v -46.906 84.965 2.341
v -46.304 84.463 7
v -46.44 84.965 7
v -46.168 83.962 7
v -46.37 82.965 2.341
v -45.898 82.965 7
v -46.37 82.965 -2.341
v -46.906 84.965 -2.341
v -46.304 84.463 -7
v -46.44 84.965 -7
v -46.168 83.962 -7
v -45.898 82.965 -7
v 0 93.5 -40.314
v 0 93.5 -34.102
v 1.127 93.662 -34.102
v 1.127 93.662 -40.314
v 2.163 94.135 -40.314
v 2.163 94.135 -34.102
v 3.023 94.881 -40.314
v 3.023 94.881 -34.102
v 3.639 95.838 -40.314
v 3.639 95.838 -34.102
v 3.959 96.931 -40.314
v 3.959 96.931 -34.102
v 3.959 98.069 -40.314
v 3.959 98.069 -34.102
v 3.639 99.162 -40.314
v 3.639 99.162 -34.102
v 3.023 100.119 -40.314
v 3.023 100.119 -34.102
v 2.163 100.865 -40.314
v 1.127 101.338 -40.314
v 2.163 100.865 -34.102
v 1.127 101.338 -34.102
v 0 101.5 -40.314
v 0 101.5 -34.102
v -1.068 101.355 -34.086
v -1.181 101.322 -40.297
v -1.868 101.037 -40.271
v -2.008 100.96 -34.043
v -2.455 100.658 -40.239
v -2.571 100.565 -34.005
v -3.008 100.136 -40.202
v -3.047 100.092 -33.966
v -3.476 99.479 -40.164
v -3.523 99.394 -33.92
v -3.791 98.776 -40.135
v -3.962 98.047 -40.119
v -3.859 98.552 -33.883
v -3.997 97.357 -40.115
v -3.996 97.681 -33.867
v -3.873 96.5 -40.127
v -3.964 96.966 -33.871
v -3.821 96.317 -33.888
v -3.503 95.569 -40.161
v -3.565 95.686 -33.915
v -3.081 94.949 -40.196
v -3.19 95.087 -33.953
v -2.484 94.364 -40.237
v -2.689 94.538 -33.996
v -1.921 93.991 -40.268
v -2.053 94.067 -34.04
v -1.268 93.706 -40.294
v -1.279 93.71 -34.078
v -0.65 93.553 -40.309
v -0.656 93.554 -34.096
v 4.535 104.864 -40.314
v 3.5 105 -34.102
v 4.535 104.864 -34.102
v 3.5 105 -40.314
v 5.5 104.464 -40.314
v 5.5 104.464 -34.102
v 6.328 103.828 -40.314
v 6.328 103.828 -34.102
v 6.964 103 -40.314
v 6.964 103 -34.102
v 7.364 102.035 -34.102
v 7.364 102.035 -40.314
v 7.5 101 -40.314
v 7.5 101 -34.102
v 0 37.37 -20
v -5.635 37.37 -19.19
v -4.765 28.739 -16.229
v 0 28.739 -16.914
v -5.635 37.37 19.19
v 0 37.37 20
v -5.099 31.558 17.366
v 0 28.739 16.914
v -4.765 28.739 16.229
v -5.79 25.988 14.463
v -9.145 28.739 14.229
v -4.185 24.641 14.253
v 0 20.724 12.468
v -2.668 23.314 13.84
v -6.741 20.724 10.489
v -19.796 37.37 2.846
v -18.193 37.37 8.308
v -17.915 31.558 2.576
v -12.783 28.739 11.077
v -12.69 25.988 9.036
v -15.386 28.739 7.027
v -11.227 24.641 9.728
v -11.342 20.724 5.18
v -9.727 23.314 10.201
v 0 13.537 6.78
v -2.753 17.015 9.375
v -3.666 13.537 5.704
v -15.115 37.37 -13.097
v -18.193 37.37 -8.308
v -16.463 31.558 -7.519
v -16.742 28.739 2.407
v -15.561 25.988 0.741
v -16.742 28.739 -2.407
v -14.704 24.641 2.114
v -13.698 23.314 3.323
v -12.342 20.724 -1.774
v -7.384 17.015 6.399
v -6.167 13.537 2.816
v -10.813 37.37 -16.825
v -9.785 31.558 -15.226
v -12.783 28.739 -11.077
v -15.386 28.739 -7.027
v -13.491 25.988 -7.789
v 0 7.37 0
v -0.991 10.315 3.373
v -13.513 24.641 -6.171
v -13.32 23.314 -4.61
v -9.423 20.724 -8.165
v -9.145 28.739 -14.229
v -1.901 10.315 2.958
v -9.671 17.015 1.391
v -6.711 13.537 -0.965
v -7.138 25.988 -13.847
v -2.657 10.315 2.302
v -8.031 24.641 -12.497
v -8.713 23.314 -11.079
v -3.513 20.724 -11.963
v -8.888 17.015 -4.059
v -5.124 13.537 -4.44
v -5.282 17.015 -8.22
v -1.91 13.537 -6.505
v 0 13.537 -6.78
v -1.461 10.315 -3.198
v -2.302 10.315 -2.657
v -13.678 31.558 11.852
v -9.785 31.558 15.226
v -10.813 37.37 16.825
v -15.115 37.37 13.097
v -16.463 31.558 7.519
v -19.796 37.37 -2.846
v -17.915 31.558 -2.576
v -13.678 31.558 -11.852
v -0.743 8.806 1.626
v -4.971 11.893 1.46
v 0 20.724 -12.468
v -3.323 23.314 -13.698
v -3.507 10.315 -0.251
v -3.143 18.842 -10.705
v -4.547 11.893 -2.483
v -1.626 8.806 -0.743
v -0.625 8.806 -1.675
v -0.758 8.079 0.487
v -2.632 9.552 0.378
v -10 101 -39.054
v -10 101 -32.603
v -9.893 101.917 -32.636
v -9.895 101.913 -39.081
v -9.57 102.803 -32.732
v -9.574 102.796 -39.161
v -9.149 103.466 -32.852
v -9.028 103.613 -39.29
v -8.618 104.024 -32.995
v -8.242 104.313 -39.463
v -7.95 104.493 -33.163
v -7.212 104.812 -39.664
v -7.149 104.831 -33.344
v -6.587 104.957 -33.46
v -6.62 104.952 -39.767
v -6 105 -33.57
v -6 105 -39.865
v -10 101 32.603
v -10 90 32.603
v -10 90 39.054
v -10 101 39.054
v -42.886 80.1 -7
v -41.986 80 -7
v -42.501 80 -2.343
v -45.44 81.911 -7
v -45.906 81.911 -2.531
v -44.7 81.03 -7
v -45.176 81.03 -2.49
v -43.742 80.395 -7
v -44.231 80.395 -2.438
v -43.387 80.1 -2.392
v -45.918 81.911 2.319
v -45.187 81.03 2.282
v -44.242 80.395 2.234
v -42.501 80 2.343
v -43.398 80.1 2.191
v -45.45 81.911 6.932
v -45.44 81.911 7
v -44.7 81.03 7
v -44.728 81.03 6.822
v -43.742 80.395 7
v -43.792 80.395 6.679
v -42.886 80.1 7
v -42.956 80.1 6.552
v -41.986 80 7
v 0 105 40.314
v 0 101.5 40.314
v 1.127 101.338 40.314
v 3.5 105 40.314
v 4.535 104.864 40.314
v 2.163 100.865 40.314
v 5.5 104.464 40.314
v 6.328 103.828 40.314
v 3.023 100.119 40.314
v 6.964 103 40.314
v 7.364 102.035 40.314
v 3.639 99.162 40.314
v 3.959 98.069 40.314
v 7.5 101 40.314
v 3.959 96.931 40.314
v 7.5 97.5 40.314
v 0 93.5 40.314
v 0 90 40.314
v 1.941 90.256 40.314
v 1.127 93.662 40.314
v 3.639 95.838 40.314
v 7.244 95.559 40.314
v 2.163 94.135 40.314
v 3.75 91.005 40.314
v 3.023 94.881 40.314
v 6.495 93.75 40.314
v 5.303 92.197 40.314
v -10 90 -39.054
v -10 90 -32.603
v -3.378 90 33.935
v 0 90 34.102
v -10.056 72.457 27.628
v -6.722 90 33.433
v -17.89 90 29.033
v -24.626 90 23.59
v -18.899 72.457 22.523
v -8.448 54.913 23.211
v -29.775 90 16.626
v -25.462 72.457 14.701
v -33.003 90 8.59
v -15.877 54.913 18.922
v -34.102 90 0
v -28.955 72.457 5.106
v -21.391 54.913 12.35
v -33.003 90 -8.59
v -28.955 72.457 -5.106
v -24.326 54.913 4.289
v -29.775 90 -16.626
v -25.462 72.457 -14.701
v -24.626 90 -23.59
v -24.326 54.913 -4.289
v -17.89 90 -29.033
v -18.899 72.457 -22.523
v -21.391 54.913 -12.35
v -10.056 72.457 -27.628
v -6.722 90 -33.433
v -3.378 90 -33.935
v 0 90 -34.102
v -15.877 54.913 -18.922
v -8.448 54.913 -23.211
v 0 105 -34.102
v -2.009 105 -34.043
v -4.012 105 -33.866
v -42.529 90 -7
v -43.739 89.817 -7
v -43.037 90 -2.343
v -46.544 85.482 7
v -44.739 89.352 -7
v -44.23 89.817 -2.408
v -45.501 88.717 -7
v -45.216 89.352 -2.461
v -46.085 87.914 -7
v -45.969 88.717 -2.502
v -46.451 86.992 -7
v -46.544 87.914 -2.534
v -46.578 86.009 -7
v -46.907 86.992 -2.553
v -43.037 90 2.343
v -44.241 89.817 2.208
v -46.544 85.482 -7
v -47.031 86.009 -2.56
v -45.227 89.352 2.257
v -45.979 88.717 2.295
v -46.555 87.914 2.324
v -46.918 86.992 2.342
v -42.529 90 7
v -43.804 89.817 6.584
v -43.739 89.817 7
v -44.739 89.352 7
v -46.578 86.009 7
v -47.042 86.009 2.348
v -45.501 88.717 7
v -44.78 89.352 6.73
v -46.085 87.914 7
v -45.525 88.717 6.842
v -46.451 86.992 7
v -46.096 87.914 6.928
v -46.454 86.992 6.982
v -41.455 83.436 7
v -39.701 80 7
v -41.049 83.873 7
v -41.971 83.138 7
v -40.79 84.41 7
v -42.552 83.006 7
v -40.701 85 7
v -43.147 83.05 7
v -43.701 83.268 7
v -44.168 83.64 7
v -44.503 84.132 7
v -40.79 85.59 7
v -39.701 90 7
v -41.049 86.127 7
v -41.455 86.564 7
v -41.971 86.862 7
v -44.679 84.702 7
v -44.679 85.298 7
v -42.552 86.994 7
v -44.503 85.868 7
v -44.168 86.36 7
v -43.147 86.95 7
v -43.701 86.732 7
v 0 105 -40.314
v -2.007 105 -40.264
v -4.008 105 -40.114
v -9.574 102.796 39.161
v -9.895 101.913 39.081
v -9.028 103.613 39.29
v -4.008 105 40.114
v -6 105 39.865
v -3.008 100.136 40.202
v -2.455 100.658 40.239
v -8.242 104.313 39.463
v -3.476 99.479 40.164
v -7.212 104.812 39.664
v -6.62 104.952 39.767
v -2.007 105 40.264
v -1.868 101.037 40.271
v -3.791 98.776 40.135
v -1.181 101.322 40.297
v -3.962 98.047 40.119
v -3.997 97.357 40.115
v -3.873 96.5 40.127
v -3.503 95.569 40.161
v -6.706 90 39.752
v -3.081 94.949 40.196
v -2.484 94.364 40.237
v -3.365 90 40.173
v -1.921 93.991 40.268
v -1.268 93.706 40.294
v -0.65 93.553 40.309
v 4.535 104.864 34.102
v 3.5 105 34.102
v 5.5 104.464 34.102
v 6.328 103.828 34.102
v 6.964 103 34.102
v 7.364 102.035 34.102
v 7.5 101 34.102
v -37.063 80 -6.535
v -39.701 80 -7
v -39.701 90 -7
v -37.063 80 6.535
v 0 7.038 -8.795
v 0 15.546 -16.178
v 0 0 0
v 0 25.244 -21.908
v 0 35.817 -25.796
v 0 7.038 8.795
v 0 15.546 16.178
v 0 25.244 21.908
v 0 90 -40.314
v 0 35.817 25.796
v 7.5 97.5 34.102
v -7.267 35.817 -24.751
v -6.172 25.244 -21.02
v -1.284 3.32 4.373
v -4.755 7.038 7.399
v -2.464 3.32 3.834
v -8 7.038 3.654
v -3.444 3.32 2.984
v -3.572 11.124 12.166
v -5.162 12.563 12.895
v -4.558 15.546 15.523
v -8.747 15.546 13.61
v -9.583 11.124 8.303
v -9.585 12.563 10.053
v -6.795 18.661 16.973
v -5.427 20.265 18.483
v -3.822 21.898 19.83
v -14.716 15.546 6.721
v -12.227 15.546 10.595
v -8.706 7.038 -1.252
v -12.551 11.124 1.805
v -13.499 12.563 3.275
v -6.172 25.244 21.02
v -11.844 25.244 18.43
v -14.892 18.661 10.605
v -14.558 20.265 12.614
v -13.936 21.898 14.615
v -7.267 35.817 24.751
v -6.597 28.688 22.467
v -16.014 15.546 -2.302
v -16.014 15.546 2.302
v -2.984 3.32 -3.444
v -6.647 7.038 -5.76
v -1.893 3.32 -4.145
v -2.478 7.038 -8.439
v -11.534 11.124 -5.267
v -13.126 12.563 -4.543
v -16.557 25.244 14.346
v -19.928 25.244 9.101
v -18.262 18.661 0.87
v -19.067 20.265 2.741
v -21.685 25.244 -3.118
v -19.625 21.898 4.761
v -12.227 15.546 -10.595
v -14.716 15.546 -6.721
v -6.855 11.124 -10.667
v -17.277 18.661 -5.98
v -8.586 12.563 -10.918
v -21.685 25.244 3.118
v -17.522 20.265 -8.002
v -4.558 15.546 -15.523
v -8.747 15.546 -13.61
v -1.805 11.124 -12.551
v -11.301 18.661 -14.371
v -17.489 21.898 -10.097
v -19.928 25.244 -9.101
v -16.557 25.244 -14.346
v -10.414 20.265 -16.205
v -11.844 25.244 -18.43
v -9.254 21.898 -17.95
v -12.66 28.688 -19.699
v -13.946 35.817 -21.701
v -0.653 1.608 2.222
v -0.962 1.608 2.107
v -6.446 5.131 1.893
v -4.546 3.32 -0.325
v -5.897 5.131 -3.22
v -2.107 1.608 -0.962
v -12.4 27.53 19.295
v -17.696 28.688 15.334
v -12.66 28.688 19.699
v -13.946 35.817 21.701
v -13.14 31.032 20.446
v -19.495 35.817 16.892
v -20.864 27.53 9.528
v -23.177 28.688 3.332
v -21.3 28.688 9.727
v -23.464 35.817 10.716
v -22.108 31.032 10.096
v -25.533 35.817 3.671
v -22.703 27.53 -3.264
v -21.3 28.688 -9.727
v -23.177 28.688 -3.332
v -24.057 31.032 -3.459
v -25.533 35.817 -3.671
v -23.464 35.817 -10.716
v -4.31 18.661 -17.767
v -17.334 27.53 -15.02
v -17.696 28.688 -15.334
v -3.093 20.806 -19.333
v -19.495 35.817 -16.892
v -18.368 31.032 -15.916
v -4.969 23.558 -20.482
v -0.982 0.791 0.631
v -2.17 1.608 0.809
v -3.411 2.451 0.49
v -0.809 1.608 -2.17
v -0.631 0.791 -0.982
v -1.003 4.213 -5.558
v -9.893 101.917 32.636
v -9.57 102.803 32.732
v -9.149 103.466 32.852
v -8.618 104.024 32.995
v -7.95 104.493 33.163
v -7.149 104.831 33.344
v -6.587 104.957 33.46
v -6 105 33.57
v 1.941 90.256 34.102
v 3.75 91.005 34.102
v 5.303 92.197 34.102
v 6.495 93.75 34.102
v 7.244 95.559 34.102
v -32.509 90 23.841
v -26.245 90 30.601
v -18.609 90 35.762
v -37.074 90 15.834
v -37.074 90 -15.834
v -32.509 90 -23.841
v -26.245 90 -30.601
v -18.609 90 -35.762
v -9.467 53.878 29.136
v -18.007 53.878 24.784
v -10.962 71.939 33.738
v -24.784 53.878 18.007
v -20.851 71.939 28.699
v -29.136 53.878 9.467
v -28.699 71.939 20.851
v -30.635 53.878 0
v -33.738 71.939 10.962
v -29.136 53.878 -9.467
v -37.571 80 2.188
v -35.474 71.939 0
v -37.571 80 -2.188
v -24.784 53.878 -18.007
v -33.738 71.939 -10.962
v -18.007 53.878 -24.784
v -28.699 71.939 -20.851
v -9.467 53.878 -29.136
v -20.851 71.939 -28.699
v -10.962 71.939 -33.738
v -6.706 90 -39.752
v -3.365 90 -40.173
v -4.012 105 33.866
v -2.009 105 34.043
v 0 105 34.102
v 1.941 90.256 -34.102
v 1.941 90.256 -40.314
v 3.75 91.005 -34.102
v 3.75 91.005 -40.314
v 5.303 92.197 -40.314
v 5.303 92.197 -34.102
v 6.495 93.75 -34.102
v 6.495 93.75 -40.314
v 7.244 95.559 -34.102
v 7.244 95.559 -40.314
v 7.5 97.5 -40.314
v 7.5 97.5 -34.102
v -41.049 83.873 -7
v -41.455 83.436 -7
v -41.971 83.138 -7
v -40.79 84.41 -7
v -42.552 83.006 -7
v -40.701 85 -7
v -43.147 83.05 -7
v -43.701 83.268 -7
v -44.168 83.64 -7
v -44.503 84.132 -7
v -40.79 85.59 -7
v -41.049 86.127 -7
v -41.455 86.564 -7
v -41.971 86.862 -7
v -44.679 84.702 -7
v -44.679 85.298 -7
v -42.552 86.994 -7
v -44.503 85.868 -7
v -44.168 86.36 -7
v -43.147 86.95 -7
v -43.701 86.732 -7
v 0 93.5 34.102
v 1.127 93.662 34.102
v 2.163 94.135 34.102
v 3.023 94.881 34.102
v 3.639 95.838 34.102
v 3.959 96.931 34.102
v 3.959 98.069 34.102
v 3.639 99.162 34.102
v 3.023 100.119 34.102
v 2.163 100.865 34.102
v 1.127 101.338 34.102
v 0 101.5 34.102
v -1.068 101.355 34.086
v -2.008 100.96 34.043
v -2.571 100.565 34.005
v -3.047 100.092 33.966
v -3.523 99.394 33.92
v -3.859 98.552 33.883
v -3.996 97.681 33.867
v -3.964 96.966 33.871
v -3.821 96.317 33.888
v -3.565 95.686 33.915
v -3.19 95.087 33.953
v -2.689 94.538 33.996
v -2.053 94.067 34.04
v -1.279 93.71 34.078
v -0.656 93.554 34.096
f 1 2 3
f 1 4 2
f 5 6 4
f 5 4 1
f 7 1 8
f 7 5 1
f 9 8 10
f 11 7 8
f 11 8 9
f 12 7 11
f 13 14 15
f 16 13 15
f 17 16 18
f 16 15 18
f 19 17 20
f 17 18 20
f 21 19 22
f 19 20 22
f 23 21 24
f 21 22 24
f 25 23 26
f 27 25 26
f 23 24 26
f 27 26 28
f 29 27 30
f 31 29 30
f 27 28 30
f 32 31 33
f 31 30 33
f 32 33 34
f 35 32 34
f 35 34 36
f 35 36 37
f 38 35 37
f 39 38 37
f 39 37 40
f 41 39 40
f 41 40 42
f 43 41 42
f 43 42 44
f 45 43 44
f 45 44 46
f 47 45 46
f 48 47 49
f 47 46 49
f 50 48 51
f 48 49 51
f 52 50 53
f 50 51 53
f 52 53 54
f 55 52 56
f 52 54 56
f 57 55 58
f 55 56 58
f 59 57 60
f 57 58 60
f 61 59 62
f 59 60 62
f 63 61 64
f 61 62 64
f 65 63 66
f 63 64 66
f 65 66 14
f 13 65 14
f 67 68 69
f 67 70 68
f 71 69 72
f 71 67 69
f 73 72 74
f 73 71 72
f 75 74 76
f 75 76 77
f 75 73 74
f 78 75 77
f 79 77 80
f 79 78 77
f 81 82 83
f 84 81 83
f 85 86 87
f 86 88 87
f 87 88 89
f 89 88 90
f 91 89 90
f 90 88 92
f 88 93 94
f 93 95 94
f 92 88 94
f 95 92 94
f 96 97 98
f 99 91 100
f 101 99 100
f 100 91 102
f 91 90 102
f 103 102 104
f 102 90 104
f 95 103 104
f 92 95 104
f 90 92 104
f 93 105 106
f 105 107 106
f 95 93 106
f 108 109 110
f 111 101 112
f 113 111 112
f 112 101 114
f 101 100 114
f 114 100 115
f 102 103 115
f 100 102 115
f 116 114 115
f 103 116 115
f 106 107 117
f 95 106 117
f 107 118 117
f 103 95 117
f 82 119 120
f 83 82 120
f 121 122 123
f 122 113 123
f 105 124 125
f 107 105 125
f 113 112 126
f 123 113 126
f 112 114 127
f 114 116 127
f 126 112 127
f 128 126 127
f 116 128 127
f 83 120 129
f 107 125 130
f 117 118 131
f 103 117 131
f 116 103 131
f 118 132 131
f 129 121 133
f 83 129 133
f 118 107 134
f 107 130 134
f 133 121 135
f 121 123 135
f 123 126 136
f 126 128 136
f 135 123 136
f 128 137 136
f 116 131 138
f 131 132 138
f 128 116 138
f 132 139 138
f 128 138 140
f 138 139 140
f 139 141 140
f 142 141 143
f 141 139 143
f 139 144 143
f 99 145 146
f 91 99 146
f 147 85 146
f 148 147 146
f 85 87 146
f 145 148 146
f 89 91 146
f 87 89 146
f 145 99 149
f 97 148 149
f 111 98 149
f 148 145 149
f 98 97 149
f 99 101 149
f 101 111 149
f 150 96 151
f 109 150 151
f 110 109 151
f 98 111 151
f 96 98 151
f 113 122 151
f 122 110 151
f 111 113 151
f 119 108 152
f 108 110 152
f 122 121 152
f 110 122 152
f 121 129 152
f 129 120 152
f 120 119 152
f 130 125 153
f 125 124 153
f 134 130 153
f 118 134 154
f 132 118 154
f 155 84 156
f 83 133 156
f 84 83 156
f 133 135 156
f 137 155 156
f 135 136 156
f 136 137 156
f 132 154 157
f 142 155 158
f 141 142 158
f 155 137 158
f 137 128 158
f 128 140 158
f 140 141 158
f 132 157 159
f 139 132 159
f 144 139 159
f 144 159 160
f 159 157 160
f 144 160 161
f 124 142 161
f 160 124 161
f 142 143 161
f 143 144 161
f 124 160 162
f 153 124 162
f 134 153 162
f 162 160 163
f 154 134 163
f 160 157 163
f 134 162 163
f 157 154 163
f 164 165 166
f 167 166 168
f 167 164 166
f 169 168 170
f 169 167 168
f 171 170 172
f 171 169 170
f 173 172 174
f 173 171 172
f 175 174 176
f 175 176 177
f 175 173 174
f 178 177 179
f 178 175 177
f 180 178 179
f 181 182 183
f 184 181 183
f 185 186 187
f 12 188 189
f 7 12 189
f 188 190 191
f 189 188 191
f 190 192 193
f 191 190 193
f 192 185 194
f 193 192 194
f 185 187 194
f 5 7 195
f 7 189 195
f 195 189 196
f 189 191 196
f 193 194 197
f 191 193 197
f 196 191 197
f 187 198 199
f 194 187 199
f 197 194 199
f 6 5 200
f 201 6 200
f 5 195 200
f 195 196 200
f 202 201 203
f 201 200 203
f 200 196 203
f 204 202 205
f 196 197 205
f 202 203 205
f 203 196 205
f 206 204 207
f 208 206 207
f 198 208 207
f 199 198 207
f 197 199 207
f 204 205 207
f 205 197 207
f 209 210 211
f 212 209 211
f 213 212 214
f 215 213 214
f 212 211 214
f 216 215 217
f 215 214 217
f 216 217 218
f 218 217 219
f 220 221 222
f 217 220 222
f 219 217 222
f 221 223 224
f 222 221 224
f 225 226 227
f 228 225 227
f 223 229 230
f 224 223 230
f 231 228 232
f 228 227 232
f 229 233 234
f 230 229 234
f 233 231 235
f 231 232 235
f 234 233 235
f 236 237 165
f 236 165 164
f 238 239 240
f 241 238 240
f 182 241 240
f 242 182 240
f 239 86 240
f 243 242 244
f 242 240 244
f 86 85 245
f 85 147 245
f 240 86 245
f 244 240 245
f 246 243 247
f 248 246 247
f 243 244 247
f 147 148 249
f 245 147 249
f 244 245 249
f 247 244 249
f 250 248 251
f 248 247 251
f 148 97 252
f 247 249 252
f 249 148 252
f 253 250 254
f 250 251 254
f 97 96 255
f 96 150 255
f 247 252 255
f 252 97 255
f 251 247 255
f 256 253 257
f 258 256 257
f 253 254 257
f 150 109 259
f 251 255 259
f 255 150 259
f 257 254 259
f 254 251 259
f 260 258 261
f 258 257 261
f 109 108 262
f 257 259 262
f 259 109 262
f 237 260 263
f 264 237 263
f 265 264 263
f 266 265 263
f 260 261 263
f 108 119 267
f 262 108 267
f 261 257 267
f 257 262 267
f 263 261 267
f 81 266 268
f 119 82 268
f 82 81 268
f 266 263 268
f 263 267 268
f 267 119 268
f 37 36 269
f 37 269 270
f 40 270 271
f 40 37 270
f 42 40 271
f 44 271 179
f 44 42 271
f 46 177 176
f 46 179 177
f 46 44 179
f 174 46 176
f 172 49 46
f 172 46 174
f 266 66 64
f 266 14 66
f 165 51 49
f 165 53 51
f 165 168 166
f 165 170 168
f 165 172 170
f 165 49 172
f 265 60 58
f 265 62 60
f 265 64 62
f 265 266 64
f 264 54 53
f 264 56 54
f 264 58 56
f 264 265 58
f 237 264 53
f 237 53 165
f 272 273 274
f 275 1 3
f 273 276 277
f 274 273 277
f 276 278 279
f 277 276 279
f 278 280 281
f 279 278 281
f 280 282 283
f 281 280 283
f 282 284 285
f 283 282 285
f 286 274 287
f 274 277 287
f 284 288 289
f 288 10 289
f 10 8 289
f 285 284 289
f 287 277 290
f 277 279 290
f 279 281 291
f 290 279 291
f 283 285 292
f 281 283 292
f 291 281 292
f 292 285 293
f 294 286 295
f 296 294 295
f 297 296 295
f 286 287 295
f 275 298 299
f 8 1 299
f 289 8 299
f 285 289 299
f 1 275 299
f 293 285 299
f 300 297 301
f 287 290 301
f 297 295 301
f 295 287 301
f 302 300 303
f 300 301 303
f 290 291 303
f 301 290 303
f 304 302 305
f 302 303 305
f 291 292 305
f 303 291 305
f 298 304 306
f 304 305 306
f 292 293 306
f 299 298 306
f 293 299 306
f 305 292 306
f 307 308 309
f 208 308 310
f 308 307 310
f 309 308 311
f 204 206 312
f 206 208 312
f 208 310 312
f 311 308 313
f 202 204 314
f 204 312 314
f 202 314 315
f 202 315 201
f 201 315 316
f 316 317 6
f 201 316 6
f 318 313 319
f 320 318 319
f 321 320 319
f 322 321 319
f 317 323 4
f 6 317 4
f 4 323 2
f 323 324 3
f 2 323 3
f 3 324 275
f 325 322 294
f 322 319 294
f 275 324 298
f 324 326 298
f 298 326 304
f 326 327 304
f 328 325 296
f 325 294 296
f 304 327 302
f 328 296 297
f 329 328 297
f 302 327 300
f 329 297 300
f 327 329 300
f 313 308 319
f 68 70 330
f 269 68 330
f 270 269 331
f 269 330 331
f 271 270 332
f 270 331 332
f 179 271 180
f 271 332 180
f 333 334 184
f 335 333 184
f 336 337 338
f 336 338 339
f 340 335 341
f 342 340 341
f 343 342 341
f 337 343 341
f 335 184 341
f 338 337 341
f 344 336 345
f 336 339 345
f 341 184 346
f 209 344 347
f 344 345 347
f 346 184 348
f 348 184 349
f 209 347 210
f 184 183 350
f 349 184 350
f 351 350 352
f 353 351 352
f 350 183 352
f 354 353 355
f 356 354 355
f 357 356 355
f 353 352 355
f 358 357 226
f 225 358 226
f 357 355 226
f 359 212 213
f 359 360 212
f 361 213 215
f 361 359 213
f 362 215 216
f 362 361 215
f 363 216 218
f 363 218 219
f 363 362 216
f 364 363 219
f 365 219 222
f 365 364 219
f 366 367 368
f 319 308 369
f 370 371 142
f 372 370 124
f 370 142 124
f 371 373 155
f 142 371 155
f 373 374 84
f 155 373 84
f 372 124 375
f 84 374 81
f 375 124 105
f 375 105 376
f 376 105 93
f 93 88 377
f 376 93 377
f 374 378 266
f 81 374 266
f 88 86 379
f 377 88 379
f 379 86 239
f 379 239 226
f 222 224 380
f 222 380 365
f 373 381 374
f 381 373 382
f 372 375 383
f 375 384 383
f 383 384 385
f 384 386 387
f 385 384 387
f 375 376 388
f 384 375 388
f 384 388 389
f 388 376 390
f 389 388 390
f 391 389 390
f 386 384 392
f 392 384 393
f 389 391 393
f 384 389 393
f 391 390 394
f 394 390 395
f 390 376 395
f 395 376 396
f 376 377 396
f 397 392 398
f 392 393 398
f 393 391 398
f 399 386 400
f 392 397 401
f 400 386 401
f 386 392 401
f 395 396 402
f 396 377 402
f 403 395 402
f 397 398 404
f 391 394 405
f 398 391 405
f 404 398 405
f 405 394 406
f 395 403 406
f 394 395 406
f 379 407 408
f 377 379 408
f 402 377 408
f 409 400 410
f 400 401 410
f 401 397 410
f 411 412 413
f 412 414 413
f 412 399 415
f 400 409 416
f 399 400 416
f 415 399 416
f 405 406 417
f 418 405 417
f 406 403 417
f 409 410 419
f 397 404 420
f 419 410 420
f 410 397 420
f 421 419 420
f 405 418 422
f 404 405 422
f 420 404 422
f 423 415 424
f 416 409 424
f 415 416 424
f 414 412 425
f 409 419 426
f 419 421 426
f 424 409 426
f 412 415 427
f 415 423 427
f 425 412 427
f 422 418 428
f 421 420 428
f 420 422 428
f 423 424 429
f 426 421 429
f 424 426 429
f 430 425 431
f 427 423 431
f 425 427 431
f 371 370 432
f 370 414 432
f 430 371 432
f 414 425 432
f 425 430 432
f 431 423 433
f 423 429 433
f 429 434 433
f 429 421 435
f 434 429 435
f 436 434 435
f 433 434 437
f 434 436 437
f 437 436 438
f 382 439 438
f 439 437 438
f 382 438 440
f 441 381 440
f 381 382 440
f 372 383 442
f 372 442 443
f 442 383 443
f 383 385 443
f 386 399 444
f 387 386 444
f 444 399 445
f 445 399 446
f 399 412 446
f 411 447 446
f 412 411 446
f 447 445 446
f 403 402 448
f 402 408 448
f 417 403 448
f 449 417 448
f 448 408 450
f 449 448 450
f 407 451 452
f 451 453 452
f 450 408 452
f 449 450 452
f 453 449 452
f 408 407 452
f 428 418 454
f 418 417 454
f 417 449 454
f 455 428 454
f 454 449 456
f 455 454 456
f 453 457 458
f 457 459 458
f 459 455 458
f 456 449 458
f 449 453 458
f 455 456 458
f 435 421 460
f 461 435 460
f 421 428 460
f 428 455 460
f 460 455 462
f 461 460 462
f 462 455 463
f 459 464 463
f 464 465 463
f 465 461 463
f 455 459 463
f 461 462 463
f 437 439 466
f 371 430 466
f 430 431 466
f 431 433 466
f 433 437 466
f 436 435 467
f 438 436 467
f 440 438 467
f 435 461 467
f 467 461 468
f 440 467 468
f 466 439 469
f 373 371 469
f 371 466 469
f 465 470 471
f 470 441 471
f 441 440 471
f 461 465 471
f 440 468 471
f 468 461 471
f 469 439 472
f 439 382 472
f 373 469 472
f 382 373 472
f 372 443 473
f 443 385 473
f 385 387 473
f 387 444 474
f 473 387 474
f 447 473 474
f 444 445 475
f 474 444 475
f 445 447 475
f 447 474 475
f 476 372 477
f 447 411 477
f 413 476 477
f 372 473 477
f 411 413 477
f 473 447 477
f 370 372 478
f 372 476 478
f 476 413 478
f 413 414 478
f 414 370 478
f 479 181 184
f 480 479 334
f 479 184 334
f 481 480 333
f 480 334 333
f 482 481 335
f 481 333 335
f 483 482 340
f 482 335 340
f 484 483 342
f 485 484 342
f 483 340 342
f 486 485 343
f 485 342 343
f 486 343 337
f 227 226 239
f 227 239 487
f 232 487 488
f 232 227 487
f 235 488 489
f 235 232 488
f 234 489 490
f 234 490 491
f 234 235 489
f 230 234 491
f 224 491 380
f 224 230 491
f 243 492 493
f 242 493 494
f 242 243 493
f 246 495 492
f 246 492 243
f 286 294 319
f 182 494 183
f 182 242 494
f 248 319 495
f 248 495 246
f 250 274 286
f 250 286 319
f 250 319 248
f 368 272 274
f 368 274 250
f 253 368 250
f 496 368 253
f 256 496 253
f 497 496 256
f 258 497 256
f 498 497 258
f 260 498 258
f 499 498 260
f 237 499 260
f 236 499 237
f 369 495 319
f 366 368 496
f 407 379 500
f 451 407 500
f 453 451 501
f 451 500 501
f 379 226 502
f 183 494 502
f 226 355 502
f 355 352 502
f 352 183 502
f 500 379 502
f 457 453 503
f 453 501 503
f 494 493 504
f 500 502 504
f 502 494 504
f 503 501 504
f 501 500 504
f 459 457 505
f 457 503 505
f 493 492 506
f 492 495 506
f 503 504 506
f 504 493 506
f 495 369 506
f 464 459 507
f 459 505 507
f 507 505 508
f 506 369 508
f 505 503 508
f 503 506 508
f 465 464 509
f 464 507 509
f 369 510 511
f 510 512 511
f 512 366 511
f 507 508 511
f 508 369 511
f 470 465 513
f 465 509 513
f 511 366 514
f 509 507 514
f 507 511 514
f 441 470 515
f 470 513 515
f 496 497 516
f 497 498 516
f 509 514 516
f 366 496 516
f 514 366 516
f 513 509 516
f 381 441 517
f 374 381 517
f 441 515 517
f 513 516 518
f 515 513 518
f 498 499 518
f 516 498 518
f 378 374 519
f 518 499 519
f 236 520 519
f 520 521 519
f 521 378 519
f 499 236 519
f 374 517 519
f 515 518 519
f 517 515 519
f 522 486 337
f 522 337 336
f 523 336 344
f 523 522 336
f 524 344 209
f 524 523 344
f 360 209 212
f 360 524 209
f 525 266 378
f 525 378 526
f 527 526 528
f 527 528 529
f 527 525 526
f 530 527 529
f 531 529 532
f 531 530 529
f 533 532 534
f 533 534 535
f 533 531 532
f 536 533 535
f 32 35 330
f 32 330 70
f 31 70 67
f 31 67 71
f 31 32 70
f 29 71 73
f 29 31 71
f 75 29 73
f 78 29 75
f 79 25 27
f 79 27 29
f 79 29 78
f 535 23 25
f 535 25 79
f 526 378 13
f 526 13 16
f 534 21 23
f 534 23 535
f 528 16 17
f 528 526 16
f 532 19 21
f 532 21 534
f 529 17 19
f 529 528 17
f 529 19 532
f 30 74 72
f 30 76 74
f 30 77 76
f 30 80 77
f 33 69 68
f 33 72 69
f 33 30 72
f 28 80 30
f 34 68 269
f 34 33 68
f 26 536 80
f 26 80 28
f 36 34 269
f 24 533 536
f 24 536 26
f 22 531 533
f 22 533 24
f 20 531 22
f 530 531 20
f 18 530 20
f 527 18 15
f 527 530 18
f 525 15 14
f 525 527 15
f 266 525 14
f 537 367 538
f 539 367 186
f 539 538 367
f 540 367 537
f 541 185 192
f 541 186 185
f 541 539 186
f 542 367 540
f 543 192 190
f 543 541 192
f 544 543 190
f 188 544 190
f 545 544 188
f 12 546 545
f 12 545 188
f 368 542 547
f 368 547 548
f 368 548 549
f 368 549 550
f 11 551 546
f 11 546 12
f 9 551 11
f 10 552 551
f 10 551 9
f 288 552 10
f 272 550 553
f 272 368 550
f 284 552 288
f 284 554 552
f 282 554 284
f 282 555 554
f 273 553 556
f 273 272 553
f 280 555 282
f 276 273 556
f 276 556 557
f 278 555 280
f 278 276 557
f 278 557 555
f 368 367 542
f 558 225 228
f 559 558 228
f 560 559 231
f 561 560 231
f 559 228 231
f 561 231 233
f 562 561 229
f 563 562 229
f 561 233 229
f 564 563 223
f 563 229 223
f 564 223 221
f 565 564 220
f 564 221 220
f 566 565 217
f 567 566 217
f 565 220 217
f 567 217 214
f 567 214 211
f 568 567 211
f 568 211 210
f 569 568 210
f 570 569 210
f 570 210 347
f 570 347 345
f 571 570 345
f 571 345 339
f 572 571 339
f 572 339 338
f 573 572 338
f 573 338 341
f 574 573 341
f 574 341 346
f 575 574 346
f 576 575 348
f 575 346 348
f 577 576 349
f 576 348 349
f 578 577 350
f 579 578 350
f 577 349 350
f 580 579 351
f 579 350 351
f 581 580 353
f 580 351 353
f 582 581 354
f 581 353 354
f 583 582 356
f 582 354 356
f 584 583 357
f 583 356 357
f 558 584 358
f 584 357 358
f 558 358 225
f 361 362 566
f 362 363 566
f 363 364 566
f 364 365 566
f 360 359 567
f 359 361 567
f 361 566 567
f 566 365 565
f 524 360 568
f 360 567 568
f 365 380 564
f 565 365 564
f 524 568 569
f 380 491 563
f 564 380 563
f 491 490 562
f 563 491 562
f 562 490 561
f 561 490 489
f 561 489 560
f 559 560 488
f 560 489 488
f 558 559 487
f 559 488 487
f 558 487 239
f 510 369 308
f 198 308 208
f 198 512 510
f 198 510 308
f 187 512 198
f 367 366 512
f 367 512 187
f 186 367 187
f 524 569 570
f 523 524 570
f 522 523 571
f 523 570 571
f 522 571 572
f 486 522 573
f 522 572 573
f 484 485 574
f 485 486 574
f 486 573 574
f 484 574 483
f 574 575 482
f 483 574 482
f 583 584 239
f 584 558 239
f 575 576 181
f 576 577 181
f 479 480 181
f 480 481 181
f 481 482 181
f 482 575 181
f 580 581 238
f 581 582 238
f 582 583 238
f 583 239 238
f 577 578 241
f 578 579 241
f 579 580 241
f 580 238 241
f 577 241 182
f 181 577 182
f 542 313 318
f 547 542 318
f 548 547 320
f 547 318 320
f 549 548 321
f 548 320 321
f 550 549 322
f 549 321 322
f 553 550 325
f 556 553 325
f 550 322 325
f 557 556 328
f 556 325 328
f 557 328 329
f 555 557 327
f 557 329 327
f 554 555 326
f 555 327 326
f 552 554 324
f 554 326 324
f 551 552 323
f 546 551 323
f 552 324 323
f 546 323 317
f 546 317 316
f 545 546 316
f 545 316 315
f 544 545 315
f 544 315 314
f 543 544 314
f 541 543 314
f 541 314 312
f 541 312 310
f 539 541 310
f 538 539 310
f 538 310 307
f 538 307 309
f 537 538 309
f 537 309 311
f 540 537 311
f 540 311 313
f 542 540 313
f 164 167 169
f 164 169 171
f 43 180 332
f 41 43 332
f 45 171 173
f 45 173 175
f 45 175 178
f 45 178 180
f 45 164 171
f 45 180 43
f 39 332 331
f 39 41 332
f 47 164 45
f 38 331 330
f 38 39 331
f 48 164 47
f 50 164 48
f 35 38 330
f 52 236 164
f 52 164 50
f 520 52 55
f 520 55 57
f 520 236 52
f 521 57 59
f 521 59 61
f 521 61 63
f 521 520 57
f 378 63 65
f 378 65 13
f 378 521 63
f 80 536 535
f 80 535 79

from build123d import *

# Parameters (mm, degrees)
REVOLUCI_N1_ANGLE           = 180
SALIENTE_EXTRUIR1_DEPTH     = 15
CROQUIS4_R                  = 4
CORTAR_EXTRUIR1_DEPTH       = 139.387389496
REVOLUCI_N2_ANGLE           = 10
REVOLUCI_N2_OTHER_WAY_ANGLE = 10
CORTAR_EXTRUIR2_DEPTH       = 10
CROQUIS7_R                  = 2
CORTAR_EXTRUIR3_DEPTH       = 125.891504895
CORTAR_EXTRUIR4_DEPTH       = 141.925841064
REDONDEO1_R                 = 4


with BuildPart() as part:
    # Croquis1 → Revolución1 (revolve)
    with BuildSketch(Plane(origin=(0, 0, 0), x_dir=(0, 0, -1), z_dir=(1, 0, 0))):
        with BuildLine():
            Line((-25.795554958, 35.816642159), (-40.313941934, 90))
            Line((-40.313941934, 90), (-34.102284852, 90))
            Line((-34.102284852, 90), (-20, 37.36955643))
            ThreePointArc((-20, 37.36955643), (-12.468451731, 20.723921943), (0, 7.36955643))
            Line((0, 7.36955643), (0, 0))
            ThreePointArc((0, 0), (-16.178409273, 15.545572574), (-25.795554958, 35.816642159))
        make_face()
    revolve(axis=Axis((0, 7.36955643, 0), (0, -1, 0)), revolution_arc=REVOLUCI_N1_ANGLE)

    # Croquis3 → Saliente-Extruir1 (add)
    with BuildSketch(Plane(origin=(0, 90, 0), x_dir=(1, 0, 0), z_dir=(0, 1, 0))):
        with BuildLine():
            Line((-10, -32.603156782), (-10, -39.053987175))
            ThreePointArc((-10, -39.053987175), (-5.039530881, -39.997712969), (0, -40.313941934))
            Line((0, -40.313941934), (10, -40.313941934))
            Line((10, -40.313941934), (10, -34.102284852))
            Line((10, -34.102284852), (0, -34.102284852))
            ThreePointArc((0, -34.102284852), (-5.055872451, -33.72542047), (-10, -32.603156782))
        make_face()
        with BuildLine():
            Line((-10, 32.603156782), (-10, 39.053987175))
            ThreePointArc((-10, 39.053987175), (-5.039530881, 39.997712969), (0, 40.313941934))
            Line((0, 40.313941934), (10, 40.313941934))
            Line((10, 40.313941934), (10, 34.102284852))
            Line((10, 34.102284852), (0, 34.102284852))
            ThreePointArc((0, 34.102284852), (-5.055872451, 33.72542047), (-10, 32.603156782))
        make_face()
    extrude(amount=SALIENTE_EXTRUIR1_DEPTH)

    # Croquis4 → Cortar-Extruir1 (cut, through all)
    with BuildSketch(Plane.XY.offset(40.313941934)):
        with Locations(Location((0, 97.5, 0), (0, 0, 270))):
            Circle(CROQUIS4_R)
    extrude(amount=-CORTAR_EXTRUIR1_DEPTH, mode=Mode.SUBTRACT)

    # Croquis5 → Revolución2 (revolve)
    with BuildSketch(Plane.XY):
        Polygon((-40.313941934, 90), (-48.313941934, 90), (-45.63445001, 80), (-37.63445001, 80), align=None)
    revolve(axis=Axis((0, 0, 0), (0, 1, 0)), revolution_arc=REVOLUCI_N2_ANGLE)

    # Croquis5 → Revolución2 other way (revolve)
    with BuildSketch(Plane.XY):
        Polygon((-40.313941934, 90), (-48.313941934, 90), (-45.63445001, 80), (-37.63445001, 80), align=None)
    revolve(axis=Axis((0, 0, 0), (0, -1, 0)), revolution_arc=REVOLUCI_N2_OTHER_WAY_ANGLE)

    # Croquis6 → Cortar-Extruir2 (cut)
    with BuildSketch(Plane(origin=(0, 90, 0), x_dir=(1, 0, 0), z_dir=(0, 1, 0))):
        Polygon((-39.701482571, 7.000442551), (-47.80408758, 7.000442551), (-47.579944596, 8.389627973), align=None)
        Polygon((-39.701482571, -7.000442551), (-47.80408758, -7.000442551), (-47.579944596, -8.389627973), align=None)
    extrude(amount=-CORTAR_EXTRUIR2_DEPTH, mode=Mode.SUBTRACT)


with BuildPart() as cortar_extruir2_kept_piece:
    # of the separate pieces the step leaves, the one the design keeps (cortar_extruir2_pieces_kept)
    add(part.part.solids().sort_by_distance((0, 0, 0))[0])

    # Croquis7 → Cortar-Extruir3 (cut, through all)
    with BuildSketch(Plane.XY.offset(7.000442551)):
        with Locations((-42.701482571, 85)):
            Circle(CROQUIS7_R)
    extrude(amount=-CORTAR_EXTRUIR3_DEPTH, mode=Mode.SUBTRACT)

    # Croquis8 → Cortar-Extruir4 (cut, through all)
    with BuildSketch(Plane.XY.offset(40.313941934)):
        with BuildLine():
            Line((7.5, 97.5), (7.5, 105))
            Line((7.5, 105), (10, 105))
            Line((10, 105), (10, 90))
            Line((10, 90), (0, 90))
            ThreePointArc((0, 90), (5.303300859, 92.196699141), (7.5, 97.5))
        make_face()
    extrude(amount=-CORTAR_EXTRUIR4_DEPTH, mode=Mode.SUBTRACT)

    # Redondeo1
    redondeo1_edges = [cortar_extruir2_kept_piece.edges().sort_by_distance(p)[0] for p in [
        (7.5, 105, -37.208113393),
        (7.5, 105, 37.208113393),
        (-10, 105, -35.828571978),
        (-10, 105, 35.828571978),
        (-45.63445001, 80, 0),
        (-48.313941934, 90, 0),
    ]]
    fillet(redondeo1_edges, radius=REDONDEO1_R)


solid = cortar_extruir2_kept_piece.part
